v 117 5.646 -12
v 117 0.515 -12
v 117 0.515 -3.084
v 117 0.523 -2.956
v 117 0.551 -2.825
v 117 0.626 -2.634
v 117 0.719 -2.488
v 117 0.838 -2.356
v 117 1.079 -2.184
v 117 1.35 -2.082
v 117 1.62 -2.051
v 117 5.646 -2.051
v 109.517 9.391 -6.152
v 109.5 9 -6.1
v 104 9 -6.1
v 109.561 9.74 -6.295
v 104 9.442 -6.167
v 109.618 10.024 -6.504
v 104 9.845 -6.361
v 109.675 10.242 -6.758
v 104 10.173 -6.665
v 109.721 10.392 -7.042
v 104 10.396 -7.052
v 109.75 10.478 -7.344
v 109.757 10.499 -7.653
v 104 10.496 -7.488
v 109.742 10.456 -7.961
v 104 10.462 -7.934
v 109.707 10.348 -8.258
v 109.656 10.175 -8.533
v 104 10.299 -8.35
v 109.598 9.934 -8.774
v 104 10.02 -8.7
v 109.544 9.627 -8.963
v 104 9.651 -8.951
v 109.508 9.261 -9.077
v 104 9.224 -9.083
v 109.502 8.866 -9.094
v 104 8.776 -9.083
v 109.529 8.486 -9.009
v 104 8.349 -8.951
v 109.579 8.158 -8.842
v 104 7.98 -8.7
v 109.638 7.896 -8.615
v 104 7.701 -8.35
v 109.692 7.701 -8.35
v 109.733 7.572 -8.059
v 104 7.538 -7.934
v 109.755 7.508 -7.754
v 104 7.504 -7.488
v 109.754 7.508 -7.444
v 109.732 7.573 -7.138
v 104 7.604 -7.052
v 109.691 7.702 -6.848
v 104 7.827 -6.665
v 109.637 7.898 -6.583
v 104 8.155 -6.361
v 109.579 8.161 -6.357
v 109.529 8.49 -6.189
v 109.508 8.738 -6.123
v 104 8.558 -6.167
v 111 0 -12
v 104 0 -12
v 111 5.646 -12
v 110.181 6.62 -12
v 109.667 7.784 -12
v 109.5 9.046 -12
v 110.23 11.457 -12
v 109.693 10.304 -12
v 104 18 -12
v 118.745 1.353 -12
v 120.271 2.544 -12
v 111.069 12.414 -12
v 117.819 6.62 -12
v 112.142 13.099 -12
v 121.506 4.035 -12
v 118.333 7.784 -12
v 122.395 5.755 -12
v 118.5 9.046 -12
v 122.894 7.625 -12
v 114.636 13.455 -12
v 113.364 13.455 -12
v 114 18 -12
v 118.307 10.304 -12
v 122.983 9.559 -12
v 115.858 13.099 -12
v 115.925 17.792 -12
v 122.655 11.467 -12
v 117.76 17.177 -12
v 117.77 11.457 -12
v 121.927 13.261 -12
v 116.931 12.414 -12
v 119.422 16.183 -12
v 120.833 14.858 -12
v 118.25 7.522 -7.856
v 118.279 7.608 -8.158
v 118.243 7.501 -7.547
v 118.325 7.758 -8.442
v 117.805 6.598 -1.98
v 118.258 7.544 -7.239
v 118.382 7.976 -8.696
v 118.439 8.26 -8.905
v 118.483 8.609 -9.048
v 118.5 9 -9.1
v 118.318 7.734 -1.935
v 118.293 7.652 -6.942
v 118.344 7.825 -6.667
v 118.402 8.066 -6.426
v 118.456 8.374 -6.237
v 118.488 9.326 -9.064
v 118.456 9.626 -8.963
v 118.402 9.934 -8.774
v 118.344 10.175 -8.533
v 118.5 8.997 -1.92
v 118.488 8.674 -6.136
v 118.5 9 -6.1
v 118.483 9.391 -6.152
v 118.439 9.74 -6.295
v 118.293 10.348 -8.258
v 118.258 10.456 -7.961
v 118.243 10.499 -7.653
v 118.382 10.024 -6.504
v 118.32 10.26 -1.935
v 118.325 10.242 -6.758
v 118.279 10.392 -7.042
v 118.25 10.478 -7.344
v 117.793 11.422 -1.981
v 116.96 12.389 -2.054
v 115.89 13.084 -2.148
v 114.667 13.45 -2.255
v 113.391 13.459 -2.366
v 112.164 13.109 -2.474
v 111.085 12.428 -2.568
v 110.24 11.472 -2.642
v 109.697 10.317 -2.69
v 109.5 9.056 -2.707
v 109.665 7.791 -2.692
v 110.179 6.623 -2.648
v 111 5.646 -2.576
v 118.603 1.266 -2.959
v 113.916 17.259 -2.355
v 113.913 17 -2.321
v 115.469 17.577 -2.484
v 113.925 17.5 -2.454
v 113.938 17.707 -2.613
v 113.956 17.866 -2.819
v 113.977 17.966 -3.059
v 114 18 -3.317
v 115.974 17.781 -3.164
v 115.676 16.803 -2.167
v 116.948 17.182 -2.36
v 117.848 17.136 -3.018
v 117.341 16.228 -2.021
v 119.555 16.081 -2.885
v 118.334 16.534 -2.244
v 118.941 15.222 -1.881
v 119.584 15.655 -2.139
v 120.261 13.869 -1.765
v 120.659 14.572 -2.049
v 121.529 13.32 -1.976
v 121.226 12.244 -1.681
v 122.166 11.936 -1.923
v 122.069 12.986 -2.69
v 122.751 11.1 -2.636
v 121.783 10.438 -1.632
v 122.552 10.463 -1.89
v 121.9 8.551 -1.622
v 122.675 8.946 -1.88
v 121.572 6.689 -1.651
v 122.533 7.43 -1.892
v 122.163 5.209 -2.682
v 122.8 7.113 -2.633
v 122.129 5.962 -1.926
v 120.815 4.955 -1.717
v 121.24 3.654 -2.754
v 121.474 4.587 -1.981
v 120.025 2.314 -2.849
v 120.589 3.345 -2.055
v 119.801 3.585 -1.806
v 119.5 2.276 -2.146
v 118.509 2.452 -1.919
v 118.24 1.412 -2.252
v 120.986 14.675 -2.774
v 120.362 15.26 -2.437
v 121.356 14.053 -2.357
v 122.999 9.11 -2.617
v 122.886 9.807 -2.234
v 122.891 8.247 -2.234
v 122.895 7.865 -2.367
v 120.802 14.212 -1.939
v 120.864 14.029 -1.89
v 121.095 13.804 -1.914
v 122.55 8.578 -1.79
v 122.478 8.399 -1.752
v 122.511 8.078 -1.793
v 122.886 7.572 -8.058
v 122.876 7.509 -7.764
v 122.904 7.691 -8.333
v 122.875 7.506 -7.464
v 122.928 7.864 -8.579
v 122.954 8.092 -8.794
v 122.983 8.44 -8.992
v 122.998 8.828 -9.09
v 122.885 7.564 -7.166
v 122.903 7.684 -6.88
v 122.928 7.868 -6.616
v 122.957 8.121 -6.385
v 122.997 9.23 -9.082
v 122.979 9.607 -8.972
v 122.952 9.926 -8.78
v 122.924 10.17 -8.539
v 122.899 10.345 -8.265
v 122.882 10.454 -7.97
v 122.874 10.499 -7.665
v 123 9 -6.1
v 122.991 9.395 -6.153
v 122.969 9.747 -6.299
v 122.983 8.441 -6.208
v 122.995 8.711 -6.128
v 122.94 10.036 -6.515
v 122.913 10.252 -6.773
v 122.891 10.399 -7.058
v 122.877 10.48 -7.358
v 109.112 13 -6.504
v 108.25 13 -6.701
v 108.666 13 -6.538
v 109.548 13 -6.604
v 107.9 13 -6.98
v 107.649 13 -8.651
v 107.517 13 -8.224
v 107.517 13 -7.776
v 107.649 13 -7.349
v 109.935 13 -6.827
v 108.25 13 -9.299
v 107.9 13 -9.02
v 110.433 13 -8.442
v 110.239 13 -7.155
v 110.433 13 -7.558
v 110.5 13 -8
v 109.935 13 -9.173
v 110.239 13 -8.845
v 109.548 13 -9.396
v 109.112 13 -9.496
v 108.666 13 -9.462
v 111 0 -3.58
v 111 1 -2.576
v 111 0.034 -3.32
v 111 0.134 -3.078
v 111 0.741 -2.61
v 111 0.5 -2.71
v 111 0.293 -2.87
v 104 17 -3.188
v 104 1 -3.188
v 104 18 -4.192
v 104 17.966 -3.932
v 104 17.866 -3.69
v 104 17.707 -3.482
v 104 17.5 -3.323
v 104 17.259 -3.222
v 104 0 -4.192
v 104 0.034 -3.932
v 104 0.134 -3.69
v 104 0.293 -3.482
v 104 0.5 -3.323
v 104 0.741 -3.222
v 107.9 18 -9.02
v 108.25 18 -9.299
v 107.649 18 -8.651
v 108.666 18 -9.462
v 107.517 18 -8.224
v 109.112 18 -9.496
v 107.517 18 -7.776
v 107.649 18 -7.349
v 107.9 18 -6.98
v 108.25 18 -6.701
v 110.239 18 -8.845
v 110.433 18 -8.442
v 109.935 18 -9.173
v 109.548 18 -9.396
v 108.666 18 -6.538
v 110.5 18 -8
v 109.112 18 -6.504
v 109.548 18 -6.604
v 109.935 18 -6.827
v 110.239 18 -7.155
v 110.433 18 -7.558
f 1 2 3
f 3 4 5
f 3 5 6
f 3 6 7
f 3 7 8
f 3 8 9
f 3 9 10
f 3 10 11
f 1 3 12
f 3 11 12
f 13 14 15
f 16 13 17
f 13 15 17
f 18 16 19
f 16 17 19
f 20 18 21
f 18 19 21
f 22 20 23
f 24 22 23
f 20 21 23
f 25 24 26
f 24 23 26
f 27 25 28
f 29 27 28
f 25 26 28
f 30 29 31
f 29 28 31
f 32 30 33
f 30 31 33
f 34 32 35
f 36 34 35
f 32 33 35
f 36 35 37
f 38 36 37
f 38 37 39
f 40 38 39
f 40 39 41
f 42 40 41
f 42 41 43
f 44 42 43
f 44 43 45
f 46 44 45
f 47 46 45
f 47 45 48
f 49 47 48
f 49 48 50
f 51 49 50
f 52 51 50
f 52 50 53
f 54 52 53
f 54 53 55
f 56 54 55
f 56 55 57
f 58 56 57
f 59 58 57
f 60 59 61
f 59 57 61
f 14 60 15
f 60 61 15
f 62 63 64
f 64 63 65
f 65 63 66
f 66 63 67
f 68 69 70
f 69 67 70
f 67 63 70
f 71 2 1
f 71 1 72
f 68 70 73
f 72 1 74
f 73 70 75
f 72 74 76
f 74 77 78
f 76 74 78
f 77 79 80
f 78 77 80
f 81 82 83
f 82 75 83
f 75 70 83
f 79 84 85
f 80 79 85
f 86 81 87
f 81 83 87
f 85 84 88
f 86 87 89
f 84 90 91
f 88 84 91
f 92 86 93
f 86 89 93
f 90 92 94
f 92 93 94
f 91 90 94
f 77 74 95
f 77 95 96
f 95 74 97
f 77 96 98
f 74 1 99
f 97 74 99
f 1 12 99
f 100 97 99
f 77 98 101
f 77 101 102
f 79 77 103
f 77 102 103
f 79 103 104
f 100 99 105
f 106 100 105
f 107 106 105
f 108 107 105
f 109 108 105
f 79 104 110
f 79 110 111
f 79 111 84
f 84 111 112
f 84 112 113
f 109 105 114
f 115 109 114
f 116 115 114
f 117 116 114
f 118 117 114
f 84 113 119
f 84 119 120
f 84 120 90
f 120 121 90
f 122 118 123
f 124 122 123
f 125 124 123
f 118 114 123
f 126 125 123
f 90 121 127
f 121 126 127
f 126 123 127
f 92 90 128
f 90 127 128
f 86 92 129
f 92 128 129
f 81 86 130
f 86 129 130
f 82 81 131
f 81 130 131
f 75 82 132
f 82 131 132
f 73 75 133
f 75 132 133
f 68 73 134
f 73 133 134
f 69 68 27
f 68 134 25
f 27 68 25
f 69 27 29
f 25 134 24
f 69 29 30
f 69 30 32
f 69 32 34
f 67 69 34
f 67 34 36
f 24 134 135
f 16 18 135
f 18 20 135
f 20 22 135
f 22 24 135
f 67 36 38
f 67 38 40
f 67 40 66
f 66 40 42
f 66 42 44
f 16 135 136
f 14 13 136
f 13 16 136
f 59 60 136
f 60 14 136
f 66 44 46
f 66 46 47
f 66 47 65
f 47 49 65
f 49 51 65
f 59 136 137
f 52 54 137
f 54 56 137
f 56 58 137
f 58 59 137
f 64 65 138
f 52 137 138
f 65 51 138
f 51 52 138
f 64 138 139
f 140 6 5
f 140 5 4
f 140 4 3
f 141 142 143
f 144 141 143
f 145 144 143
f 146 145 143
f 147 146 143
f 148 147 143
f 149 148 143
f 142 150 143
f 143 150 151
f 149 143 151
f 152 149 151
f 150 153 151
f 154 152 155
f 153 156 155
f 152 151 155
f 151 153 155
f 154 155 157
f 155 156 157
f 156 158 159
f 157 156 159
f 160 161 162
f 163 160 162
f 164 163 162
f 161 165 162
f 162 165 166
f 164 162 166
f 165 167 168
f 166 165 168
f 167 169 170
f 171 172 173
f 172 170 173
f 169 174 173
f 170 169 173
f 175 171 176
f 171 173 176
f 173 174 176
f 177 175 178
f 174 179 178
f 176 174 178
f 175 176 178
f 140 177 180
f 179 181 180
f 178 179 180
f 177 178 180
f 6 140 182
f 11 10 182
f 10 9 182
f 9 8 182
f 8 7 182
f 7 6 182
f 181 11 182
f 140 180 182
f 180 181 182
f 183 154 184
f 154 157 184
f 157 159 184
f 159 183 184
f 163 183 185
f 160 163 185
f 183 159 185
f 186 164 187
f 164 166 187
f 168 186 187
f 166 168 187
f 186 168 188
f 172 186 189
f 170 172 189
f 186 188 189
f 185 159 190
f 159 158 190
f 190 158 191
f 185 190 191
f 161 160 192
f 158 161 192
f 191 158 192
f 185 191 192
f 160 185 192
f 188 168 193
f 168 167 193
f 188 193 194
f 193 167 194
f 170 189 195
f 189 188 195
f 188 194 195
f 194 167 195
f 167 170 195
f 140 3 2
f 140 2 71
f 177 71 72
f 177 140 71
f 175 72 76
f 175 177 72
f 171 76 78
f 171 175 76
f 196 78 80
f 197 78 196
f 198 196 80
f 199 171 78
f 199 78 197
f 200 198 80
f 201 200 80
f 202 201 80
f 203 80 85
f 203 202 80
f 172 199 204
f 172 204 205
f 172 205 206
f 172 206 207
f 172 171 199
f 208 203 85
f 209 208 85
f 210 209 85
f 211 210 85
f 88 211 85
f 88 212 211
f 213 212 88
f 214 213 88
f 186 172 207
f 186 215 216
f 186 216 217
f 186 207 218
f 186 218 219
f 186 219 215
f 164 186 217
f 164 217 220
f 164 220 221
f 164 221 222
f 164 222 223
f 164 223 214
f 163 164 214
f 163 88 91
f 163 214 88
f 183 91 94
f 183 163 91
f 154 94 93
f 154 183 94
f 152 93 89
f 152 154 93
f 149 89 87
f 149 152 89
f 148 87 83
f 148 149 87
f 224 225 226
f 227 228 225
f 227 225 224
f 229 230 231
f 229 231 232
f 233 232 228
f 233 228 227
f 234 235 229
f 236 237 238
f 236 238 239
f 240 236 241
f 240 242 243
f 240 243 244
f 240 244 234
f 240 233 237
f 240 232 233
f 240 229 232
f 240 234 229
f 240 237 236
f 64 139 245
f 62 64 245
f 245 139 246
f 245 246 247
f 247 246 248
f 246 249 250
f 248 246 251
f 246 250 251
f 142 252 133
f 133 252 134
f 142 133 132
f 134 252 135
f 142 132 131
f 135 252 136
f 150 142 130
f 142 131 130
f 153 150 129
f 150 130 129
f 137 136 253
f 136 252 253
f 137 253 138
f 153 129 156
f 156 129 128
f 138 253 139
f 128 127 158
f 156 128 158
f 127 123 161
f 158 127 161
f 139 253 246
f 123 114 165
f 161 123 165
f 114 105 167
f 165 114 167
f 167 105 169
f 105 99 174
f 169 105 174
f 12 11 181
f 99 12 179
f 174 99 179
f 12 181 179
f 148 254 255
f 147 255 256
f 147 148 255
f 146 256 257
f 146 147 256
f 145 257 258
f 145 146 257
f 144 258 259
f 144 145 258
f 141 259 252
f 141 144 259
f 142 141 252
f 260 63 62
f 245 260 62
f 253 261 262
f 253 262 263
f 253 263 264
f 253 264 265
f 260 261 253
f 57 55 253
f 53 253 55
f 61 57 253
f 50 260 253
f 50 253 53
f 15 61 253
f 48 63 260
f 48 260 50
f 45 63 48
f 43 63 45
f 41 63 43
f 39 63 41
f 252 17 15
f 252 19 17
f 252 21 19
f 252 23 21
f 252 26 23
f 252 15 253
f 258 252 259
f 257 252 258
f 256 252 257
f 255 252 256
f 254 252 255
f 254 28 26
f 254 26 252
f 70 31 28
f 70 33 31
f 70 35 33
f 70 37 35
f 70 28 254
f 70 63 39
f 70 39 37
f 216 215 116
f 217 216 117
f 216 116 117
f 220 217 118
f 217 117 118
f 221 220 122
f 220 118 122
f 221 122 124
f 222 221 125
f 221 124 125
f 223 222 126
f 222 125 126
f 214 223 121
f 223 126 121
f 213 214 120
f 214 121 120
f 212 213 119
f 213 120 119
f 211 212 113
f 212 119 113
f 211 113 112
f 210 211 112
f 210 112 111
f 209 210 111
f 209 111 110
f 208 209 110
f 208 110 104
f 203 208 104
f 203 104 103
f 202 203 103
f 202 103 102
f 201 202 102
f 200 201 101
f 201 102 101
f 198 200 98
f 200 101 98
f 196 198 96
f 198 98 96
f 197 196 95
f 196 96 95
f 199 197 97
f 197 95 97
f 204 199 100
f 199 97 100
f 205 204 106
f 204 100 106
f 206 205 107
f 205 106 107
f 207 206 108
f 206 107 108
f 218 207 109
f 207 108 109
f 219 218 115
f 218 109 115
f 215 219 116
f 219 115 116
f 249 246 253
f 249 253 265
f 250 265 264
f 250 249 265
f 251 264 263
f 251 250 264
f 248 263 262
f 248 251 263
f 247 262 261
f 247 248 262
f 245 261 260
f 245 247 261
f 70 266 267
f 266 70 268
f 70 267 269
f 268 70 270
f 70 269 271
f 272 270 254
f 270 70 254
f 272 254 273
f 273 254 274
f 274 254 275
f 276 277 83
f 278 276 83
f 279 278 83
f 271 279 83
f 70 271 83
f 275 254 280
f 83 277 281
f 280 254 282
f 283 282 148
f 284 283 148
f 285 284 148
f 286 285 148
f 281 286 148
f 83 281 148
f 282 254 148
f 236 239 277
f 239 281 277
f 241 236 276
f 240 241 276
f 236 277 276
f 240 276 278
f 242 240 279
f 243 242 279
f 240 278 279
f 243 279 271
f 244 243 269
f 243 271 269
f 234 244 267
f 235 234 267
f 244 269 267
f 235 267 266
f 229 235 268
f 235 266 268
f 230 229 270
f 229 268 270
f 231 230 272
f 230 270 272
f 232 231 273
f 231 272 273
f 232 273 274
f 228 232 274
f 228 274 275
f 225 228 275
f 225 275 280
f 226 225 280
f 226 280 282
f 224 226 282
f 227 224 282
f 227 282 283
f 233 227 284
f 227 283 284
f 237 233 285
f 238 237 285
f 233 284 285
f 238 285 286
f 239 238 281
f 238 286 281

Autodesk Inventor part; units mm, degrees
ref_plane "YZ Plane" through (0, 0, 0) normal (1, 0, 0) x (0, 1, 0)
ref_plane "XZ Plane" through (0, 0, 0) normal (0, 1, 0) x (-1, 0, 0)
ref_plane "XY Plane" through (0, 0, 0) normal (0, 0, 1) x (1, 0, 0)
sketch "Sketch1" plane through (0, 0, 0) normal (0, 0, 1) x (1, 0, 0)
  line L0 (0, 0) -> (114, 0)
  arc A0 (114, 0) -> (114, 18) centre (114, 9) ccw
  arc A1 (0, 21) -> (0, 0) centre (0, 10.5) ccw
  line L1 (0, 21) -> (20.7846, 18)
  line L2 (20.7846, 18) -> (114, 18)
  circle A2 centre (114, 9) radius 4.5
  dimension "d0" = 114
  dimension "d1" = 18
  dimension "d2" = 9
  dimension "d3" = 21
  dimension "d4" = 10.5
  dimension "d5" = 21
  dimension "d6" = 9
extrude "Extrusion1" add sketch "Sketch1" against normal blind 12
sketch "Sketch2" plane through (0, 0, 0) normal (0, 0, 1) x (1, 0, 0)
  line L0 (111, 0) -> (117, 0)
  line L1 (117, 0) -> (117, 6)
  line L2 (117, 6) -> (111, 6)
  line L3 (111, 6) -> (111, 0)
  point P0 (0, 0)
  dimension "d9" = 6
  dimension "d10" = 6
extrude "Extrusion2" cut sketch "Sketch2" against normal through all
sketch "Sketch3" plane through (0, 0, -12) normal (0, -1, 0) x (1, 0, 0)
  line L0 (-10.5, 12) -> (-10.5, 4)
  line L1 (-10.5, 12) -> (-10.5, 0) projected
  line L2 (-10.5, 4) -> (49, 4)
  line L3 (49, 4) -> (140.4404, 12)
  line L4 (140.4404, 12) -> (-10.5, 12)
  point P0 (0, 12)
  dimension "d13" = 8
  dimension "d14" = 59.5
  dimension "d15" = 175
extrude "Extrusion3" cut sketch "Sketch3" against normal through all
sketch "Sketch4" plane through (0, 0, -12) normal (0, 0, -1) x (-1, 0, 0)
  line L0 (10.5, 0) -> (-104, 0)
  line L1 (-104, 0) -> (-104, 21)
  line L2 (-104, 21) -> (10.5, 21)
  line L3 (10.5, 21) -> (10.5, 0)
  point P0 (0, 0)
  dimension "d18" = 114.5
  dimension "d19" = 21
extrude "Extrusion4" cut sketch "Sketch4" against normal through all
sketch "Sketch5" plane through (104, 0, -12) normal (-1, 0, 0) x (0, 0, 1)
  circle A0 centre (4.4, 9) radius 1.5
  point P0 (12, 0)
  dimension "d29" = 3
extrude "Extrusion5" cut sketch "Sketch5" against normal through all
fillet "Fillet1" radius 1 3 edges at (109, 18, -2.7507) (122.8704, 10.5219, -1.5372) (107.5, 0, -2.8819)
sketch "Sketch6" plane through (104, 18, -12) normal (0, 1, 0) x (1, 0, 0)
  circle A0 centre (5, -4) radius 1.5
  point P0 (-104, -12)
  dimension "d26" = 3
extrude "Extrusion6" cut sketch "Sketch6" against normal blind 5
properties part number "Hand - Digit 4"
